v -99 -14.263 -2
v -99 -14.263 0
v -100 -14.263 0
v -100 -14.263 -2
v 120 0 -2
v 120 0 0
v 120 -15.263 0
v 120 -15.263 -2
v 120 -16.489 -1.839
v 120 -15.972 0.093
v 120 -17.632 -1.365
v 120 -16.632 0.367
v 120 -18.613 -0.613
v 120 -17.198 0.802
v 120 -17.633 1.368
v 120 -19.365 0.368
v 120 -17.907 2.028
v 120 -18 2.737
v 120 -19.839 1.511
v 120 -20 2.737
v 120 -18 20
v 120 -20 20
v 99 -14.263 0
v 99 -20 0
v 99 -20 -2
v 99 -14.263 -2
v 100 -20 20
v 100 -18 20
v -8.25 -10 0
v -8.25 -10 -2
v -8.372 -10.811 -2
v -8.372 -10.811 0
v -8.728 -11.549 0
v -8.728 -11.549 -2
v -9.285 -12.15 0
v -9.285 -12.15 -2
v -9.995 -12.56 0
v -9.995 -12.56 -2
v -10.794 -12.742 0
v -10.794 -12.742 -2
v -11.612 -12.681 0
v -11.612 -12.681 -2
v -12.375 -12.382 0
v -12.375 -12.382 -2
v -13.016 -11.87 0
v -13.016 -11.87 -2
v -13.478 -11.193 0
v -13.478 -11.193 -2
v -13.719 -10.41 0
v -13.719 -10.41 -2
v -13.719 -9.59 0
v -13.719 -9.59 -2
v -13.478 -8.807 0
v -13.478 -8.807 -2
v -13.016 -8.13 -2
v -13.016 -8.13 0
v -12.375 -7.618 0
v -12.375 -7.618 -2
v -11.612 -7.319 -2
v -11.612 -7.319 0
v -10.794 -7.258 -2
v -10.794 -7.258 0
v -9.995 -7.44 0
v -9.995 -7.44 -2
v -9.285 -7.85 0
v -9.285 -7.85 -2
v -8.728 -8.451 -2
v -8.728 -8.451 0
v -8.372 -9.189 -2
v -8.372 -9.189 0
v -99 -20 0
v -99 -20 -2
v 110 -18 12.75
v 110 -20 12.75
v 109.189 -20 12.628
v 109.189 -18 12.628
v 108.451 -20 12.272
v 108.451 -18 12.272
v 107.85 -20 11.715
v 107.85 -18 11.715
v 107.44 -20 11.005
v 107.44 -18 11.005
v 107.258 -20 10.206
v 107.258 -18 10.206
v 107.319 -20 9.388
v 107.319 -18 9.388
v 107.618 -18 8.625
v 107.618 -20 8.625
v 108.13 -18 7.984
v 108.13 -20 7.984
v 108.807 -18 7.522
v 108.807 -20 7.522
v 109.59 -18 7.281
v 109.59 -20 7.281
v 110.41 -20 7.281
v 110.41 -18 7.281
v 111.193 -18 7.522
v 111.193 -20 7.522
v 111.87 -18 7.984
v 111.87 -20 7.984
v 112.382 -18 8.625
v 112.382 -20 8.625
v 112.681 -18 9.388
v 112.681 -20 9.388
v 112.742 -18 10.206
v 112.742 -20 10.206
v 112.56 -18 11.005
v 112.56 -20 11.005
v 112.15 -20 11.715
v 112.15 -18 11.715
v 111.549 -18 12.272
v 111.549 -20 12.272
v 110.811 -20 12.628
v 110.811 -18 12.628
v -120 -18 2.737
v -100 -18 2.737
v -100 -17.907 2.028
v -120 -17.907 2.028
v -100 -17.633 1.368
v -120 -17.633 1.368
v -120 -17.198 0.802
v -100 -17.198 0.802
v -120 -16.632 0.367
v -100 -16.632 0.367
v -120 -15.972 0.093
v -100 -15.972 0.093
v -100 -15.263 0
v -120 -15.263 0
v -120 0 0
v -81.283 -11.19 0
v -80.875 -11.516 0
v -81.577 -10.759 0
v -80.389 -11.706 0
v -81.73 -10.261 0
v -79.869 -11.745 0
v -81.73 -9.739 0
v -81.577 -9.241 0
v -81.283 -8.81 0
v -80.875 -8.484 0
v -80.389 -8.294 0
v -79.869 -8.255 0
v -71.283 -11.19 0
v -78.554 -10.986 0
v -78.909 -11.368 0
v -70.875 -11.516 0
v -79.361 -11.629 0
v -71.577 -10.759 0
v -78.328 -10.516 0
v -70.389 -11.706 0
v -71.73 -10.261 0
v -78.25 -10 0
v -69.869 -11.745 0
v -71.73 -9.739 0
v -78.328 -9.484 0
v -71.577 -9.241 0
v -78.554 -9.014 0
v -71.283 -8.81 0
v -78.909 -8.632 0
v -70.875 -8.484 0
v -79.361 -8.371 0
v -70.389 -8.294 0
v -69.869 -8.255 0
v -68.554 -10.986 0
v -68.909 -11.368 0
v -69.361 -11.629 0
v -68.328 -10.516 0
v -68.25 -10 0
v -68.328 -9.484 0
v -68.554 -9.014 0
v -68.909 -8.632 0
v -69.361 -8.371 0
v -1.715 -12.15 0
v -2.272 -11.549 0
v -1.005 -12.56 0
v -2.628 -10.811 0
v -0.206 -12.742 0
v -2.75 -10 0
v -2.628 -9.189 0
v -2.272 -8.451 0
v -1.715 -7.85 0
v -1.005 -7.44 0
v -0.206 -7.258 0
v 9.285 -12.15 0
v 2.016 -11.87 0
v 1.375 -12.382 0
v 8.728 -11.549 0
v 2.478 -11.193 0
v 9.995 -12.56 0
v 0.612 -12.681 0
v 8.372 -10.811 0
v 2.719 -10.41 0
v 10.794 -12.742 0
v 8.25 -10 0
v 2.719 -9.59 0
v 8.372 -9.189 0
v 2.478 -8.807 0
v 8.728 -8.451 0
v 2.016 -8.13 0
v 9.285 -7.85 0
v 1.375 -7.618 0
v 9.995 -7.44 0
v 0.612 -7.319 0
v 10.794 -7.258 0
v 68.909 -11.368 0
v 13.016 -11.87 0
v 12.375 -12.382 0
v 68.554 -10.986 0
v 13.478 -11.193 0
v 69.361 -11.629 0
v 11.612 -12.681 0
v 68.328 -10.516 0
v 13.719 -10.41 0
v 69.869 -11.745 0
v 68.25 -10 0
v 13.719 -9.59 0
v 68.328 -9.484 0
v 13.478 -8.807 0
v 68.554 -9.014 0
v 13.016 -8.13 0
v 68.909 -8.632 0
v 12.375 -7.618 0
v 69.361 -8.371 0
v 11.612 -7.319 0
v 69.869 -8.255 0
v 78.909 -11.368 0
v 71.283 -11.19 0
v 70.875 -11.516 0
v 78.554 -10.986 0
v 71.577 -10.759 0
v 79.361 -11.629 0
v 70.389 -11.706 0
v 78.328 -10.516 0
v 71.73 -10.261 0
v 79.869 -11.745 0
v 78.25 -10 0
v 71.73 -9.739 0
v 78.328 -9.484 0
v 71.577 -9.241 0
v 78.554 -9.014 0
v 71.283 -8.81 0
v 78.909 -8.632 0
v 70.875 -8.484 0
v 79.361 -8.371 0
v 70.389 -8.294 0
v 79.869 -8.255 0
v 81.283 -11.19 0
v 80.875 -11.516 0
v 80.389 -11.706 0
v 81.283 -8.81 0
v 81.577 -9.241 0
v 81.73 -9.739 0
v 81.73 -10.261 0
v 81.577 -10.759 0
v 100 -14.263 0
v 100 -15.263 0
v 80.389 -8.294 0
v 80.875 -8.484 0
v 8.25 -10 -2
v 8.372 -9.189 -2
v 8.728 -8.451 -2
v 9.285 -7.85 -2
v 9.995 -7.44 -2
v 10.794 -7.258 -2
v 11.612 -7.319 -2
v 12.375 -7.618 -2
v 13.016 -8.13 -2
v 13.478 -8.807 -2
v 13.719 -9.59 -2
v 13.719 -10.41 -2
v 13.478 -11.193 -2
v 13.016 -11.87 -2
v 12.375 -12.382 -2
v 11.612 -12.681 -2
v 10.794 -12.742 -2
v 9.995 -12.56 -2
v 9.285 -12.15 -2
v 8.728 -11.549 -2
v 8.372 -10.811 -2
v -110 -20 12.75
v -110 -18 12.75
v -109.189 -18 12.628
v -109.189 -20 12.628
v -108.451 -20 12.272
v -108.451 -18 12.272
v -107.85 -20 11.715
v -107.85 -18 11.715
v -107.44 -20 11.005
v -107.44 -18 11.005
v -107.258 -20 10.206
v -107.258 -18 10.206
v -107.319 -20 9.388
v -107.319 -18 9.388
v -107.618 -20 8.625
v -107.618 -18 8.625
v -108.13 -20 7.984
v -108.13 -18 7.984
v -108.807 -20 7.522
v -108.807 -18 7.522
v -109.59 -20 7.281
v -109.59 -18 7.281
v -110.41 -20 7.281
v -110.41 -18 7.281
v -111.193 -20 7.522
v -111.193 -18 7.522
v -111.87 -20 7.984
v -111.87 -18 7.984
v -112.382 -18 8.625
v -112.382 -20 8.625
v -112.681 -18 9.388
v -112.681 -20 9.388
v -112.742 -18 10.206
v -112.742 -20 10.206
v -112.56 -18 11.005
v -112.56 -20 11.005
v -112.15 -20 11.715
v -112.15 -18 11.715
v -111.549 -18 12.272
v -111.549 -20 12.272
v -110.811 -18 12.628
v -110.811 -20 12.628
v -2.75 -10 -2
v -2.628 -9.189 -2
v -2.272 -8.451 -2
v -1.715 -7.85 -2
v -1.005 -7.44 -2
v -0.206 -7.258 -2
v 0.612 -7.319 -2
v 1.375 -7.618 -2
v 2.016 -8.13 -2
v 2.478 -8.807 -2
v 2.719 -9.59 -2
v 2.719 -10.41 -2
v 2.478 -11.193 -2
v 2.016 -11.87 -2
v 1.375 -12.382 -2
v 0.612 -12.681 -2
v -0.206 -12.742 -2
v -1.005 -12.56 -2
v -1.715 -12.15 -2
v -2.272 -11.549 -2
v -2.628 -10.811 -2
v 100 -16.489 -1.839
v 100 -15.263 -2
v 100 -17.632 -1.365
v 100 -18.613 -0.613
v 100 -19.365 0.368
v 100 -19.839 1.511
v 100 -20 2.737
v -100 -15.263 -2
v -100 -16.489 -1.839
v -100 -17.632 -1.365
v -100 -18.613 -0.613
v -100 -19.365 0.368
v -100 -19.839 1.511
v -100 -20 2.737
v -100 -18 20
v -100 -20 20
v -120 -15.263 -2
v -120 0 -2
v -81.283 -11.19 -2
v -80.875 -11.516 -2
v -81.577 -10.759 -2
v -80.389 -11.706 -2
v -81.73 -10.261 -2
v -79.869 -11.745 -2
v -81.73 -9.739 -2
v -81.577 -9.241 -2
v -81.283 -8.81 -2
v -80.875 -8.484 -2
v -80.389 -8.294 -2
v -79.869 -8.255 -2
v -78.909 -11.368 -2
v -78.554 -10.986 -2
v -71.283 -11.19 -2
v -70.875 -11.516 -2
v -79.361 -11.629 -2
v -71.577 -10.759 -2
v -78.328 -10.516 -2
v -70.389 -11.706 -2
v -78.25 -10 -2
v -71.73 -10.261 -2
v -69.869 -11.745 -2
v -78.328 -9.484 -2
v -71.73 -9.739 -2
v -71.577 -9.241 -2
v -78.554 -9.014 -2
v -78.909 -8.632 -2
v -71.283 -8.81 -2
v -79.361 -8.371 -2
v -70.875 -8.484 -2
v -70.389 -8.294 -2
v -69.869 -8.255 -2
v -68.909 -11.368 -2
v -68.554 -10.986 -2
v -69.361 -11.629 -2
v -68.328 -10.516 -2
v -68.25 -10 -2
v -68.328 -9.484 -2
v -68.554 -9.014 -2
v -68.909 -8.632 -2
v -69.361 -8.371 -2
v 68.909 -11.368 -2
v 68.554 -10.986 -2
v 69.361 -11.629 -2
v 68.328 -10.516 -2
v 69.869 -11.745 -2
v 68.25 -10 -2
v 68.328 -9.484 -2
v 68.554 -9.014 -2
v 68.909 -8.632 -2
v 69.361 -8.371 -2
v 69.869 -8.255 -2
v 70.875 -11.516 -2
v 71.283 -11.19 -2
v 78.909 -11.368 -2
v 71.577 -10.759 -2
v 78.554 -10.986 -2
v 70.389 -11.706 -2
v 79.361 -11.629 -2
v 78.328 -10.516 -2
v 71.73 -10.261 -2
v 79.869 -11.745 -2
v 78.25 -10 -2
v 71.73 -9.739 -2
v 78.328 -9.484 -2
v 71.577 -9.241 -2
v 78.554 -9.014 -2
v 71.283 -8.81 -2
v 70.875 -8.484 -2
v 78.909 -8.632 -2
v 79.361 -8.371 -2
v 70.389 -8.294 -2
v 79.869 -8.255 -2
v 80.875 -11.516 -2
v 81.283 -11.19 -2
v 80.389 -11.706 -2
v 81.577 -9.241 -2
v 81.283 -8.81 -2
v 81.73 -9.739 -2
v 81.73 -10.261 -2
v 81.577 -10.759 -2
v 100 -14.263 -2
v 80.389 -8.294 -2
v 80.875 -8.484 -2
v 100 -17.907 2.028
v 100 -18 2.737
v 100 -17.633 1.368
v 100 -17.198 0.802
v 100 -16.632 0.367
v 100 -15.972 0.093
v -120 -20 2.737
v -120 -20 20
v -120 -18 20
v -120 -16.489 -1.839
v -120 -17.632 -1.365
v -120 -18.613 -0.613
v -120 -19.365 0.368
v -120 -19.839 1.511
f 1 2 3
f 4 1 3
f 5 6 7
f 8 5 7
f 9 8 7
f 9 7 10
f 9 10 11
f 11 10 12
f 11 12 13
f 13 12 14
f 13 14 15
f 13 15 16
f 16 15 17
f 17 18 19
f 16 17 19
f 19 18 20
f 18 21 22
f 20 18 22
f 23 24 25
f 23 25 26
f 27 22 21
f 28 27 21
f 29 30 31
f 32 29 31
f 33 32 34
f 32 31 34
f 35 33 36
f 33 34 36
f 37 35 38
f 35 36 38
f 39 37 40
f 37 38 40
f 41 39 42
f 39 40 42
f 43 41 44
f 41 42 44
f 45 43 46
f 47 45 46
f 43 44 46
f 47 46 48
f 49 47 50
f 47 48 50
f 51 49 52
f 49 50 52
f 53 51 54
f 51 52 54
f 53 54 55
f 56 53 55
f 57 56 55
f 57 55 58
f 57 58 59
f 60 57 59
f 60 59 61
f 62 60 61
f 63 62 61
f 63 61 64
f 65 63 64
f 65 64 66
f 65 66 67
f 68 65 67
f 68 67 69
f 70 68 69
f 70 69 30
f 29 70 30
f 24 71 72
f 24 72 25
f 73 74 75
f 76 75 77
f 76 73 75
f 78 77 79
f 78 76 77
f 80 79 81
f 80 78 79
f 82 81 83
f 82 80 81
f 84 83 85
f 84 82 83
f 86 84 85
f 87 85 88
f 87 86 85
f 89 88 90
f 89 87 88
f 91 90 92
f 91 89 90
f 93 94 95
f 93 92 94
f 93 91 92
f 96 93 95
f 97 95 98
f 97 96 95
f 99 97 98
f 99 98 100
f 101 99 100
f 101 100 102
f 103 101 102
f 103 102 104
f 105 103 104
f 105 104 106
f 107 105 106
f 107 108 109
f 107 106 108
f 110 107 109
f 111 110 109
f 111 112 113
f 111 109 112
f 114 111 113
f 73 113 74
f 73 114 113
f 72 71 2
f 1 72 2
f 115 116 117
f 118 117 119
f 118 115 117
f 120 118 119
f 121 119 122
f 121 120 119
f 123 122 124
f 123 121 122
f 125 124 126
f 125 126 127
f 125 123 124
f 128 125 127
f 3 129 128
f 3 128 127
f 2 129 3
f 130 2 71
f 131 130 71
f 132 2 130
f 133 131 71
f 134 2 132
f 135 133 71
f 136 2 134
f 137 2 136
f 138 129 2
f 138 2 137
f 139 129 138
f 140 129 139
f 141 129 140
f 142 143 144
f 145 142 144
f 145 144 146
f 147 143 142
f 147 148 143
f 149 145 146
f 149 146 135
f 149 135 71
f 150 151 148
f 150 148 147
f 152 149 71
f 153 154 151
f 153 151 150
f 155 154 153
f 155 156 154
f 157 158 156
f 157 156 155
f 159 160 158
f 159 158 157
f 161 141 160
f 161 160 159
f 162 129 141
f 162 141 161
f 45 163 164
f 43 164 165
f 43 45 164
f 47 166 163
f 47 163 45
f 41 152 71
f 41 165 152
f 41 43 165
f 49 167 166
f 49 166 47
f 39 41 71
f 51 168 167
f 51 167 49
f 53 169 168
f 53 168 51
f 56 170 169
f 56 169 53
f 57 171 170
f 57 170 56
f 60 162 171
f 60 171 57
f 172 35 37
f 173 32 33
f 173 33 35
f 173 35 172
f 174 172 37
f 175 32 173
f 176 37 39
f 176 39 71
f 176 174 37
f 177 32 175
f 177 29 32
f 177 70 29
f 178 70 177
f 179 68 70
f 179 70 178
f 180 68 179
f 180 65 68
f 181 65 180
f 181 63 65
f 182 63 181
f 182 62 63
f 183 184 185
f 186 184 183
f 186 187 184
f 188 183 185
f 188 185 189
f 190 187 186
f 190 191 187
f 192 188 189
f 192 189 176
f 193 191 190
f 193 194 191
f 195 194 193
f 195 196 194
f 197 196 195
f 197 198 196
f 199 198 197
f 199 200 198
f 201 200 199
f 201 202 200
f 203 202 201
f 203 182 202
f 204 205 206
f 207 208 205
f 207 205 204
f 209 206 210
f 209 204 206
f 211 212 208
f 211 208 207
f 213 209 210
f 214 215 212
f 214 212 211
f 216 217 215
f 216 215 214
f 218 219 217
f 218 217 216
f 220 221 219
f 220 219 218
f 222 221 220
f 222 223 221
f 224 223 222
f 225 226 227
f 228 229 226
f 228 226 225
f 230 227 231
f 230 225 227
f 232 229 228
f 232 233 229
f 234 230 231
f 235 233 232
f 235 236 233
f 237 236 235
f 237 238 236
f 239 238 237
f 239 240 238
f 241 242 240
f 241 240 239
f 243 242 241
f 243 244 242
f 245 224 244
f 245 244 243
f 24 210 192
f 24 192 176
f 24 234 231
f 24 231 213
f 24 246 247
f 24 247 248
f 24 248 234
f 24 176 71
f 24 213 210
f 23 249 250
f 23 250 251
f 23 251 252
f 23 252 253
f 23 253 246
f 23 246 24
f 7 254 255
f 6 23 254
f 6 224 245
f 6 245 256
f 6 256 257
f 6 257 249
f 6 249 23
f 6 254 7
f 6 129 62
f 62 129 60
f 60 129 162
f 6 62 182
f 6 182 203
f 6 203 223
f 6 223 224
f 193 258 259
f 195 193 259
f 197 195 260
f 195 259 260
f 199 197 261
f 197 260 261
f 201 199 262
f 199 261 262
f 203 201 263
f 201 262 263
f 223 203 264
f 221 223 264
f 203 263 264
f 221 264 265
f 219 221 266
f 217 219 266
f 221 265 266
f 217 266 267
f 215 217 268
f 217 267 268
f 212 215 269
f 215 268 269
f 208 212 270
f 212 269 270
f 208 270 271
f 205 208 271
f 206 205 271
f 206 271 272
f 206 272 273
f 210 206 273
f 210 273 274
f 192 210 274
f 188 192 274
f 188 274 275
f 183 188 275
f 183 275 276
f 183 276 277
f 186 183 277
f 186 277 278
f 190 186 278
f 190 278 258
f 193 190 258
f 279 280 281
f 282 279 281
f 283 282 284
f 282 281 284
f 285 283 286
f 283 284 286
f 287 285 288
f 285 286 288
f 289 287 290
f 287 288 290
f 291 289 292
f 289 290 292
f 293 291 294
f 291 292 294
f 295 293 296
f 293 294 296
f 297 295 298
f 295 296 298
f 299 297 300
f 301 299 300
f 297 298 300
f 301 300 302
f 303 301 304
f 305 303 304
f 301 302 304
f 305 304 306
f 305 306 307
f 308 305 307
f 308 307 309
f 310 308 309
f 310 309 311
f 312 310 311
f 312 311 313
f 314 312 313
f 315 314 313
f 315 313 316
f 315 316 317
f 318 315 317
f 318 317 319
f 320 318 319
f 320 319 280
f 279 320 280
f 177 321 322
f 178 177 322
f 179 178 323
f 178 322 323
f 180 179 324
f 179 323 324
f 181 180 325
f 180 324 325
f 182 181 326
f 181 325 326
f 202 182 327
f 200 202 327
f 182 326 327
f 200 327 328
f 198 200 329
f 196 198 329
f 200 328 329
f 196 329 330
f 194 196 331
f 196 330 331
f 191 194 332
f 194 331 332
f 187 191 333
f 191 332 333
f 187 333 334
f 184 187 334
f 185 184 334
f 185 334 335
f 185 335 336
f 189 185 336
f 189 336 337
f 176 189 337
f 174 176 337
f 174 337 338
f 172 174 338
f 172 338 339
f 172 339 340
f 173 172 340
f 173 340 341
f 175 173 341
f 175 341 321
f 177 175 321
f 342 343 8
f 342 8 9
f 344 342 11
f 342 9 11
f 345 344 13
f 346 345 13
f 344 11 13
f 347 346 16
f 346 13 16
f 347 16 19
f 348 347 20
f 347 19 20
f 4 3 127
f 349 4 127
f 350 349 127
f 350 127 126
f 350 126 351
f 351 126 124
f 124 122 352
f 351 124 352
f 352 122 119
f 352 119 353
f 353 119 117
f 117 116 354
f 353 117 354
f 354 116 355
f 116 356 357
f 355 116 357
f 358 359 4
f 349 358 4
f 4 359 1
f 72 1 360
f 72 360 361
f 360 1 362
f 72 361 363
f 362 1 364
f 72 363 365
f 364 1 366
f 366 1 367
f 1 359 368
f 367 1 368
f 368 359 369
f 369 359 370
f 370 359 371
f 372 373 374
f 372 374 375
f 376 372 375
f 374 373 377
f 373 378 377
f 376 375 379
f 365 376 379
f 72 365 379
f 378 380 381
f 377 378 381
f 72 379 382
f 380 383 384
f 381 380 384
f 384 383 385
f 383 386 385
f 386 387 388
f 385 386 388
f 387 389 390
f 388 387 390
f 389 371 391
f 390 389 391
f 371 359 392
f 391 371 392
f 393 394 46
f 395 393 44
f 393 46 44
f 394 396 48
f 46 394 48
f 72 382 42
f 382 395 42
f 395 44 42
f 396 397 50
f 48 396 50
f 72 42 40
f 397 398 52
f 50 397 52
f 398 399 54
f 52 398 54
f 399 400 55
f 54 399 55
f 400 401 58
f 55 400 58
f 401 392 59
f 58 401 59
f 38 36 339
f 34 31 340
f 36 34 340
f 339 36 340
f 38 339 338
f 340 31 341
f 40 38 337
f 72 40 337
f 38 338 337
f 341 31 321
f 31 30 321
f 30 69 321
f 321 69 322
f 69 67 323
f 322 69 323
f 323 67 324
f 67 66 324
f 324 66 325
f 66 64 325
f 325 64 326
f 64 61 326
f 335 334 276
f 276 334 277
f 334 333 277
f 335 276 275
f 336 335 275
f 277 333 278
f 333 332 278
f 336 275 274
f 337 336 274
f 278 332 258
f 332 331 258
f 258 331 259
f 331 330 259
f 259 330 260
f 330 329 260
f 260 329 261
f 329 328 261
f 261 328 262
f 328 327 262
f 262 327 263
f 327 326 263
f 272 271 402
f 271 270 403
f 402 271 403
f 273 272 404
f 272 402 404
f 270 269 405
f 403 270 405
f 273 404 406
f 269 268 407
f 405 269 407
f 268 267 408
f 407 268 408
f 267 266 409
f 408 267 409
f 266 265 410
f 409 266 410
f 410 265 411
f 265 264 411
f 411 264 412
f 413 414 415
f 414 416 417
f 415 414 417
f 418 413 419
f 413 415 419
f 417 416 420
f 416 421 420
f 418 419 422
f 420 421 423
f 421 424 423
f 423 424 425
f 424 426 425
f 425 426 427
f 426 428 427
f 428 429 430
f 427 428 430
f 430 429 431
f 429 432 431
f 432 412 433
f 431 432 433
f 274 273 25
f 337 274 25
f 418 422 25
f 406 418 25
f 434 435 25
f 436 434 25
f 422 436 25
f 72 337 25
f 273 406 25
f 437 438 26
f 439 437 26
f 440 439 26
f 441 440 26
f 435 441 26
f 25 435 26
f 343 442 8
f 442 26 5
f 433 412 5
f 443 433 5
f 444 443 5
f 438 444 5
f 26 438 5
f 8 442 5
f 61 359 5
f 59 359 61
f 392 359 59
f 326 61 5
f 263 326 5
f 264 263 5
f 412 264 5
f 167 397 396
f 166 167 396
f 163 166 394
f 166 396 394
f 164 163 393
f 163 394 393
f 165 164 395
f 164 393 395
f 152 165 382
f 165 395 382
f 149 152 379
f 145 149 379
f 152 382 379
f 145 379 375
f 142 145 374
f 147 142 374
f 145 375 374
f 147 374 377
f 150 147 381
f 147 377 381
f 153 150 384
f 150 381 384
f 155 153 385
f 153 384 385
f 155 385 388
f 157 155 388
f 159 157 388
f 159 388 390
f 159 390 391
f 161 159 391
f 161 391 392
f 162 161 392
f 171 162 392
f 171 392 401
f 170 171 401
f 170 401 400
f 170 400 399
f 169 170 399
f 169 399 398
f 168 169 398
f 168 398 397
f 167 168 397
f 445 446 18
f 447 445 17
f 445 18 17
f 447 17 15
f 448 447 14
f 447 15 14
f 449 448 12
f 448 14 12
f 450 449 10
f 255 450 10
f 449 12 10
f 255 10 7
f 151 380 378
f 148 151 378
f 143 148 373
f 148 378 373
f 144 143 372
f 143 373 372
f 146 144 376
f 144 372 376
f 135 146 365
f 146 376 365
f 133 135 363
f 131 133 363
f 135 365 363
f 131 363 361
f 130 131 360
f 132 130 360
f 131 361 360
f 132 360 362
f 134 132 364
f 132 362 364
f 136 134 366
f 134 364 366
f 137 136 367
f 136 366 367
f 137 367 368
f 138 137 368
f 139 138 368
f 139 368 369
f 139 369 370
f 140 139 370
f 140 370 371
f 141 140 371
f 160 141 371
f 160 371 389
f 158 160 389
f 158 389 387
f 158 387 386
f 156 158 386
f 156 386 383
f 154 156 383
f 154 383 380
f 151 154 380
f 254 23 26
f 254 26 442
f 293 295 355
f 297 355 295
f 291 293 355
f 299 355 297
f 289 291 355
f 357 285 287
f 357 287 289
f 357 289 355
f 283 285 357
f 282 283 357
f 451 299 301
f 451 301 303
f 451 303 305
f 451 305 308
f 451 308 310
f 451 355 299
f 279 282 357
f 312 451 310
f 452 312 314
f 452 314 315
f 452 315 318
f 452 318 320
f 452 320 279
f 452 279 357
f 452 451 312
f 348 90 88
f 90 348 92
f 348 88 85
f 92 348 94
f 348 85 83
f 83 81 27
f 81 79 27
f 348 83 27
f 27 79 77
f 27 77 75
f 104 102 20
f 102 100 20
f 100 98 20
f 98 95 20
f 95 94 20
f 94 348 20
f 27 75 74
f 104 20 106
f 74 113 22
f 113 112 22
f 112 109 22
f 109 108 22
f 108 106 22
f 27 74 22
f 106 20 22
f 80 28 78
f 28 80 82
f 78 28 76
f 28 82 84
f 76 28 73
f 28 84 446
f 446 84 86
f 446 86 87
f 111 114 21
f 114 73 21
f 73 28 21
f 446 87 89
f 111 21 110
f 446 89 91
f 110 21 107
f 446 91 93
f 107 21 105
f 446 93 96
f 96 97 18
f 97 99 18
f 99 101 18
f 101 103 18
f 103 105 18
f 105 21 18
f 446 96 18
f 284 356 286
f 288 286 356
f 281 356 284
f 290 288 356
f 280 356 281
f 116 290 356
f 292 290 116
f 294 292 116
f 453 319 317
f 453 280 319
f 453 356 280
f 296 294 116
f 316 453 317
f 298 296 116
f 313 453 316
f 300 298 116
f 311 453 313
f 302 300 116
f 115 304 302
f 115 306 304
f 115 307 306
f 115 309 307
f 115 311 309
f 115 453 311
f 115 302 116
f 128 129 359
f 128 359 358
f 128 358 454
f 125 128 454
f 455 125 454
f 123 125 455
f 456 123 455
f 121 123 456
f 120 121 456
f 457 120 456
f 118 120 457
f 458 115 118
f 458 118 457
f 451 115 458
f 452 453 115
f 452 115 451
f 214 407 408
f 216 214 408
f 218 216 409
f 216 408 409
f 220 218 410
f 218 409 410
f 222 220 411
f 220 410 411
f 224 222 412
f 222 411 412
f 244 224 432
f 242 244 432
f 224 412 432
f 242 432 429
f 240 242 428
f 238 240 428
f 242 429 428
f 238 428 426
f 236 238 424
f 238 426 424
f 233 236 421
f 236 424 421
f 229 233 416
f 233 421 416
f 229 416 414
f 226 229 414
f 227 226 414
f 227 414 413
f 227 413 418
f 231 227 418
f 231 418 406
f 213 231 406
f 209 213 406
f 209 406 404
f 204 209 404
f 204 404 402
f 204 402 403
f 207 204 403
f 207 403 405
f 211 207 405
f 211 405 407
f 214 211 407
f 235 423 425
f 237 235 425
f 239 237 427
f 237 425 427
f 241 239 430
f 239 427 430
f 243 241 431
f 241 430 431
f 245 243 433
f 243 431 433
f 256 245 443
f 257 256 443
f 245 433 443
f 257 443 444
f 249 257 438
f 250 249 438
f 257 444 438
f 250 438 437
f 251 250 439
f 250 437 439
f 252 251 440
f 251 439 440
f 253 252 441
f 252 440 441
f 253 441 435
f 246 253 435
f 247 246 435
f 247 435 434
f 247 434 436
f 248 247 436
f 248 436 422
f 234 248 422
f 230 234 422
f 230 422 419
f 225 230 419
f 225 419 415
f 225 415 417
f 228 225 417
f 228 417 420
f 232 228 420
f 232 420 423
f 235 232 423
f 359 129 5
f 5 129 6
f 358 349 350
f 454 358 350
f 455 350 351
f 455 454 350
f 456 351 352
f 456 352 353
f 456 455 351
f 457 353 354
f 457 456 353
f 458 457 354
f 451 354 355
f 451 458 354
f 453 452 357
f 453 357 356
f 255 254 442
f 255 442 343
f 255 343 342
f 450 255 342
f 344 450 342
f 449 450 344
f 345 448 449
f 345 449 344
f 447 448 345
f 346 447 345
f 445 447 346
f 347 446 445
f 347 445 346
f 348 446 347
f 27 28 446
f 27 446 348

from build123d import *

# Parameters (mm, degrees)
SKETCH_1_W                        = 240
SKETCH_1_H                        = 20
SM_BASE_FLANGE_1_DEPTH            = 2
SM_EDGE_FLANGE_1_STRIP_W          = 13.4732
SM_EDGE_FLANGE_1_STRIP_H          = 2
SM_EDGE_FLANGE_1_STRIP_CUT_DEPTH  = 20
SM_EDGE_FLANGE_1_RELIEF_W         = 14.4732
SM_EDGE_FLANGE_1_RELIEF_H         = 1
SM_EDGE_FLANGE_1_RELIEF_CUT_DEPTH = 2
SM_EDGE_FLANGE_1_DEPTH            = 20
SKETCH_10_R                       = 2.75
CUT_EXTRUDE_2_DEPTH               = 10
SKETCH_11_R                       = 2.75
SKETCH_11_R_2                     = 1.75
CUT_EXTRUDE_3_DEPTH               = 10


# Sheet-metal steps are written as plain solids
with BuildPart() as part:
    # Sketch 1 → 基体-法兰1 (new body)
    with BuildSketch(Plane.XY):
        with Locations((0, -10)):
            Rectangle(SKETCH_1_W, SKETCH_1_H)
    extrude(amount=-SM_BASE_FLANGE_1_DEPTH)

    # 边线-法兰1 strip (across the edge) → 边线-法兰1 strip cut (cut)
    with BuildSketch(Plane(origin=(-120, -20, 0), x_dir=(0, 1, 0), z_dir=(1, 0, 0))):
        with Locations((-2, -1)):
            Rectangle(SM_EDGE_FLANGE_1_STRIP_W, SM_EDGE_FLANGE_1_STRIP_H)
    sm_edge_flange_1_strip_cut = extrude(amount=SM_EDGE_FLANGE_1_STRIP_CUT_DEPTH, mode=Mode.SUBTRACT)

    # 边线-法兰1 relief (on the sheet) → 边线-法兰1 relief cut (cut)
    with BuildSketch(Plane(origin=(-120, -15.2634, 0), x_dir=(0, 1, 0), z_dir=(0, 0, 1))):
        with Locations((-6.2366, -20.5)):
            Rectangle(SM_EDGE_FLANGE_1_RELIEF_W, SM_EDGE_FLANGE_1_RELIEF_H)
    sm_edge_flange_1_relief_cut = extrude(amount=-SM_EDGE_FLANGE_1_RELIEF_CUT_DEPTH, mode=Mode.SUBTRACT)

    # 边线-法兰1 section (across the edge) → 边线-法兰1 (add)
    with BuildSketch(Plane(origin=(-120, -20, 0), x_dir=(0, 1, 0), z_dir=(1, 0, 0))):
        with BuildLine():
            Line((0, 2.7366), (0, 20))
            Line((0, 20), (2, 20))
            Line((2, 20), (2, 2.7366))
            ThreePointArc((2, 2.7366), (2.801531583, 0.801531583), (4.7366, 0))
            Line((4.7366, 0), (4.7366, -2))
            ThreePointArc((4.7366, -2), (1.38731802, -0.61268198), (0, 2.7366))
        make_face()
    sm_edge_flange_1 = extrude(amount=SM_EDGE_FLANGE_1_DEPTH)

    # 草图10 → 切除-拉伸2 (cut)
    with BuildSketch(Plane(origin=(0, -18, 0), x_dir=(1, 0, 0), z_dir=(0, 1, 0))):
        with Locations(Location((-110, -10, 0), (0, 0, 270))):
            Circle(SKETCH_10_R)
    cut_extrude_2 = extrude(amount=-CUT_EXTRUDE_2_DEPTH, mode=Mode.SUBTRACT)

    # 镜向1: 边线-法兰1 strip cut, 边线-法兰1 relief cut, 边线-法兰1, 切除-拉伸2 across plane
    add(sm_edge_flange_1_strip_cut.mirror(Plane(origin=(0, 0, 0), x_dir=(0, 0, 1), z_dir=(1, 0, 0))), mode=Mode.SUBTRACT)
    add(sm_edge_flange_1_relief_cut.mirror(Plane(origin=(0, 0, 0), x_dir=(0, 0, 1), z_dir=(1, 0, 0))), mode=Mode.SUBTRACT)
    add(sm_edge_flange_1.mirror(Plane(origin=(0, 0, 0), x_dir=(0, 0, 1), z_dir=(1, 0, 0))))
    add(cut_extrude_2.mirror(Plane(origin=(0, 0, 0), x_dir=(0, 0, 1), z_dir=(1, 0, 0))), mode=Mode.SUBTRACT)

    # 草图11 → 切除-拉伸3 (cut)
    with BuildSketch(Plane(origin=(0, 0, -2), x_dir=(-1, 0, 0), z_dir=(0, 0, -1))):
        with Locations((0, -10)):
            Circle(SKETCH_11_R)
        with Locations((-11, -10)):
            Circle(SKETCH_11_R)
        with Locations(Location((11, -10, 0), (0, 0, 180))):
            Circle(SKETCH_11_R)
        with Locations((-80, -10)):
            Circle(SKETCH_11_R_2)
        with Locations((-70, -10)):
            Circle(SKETCH_11_R_2)
        with Locations(Location((80, -10, 0), (0, 0, 180))):
            Circle(SKETCH_11_R_2)
        with Locations(Location((70, -10, 0), (0, 0, 180))):
            Circle(SKETCH_11_R_2)
    extrude(amount=-CUT_EXTRUDE_3_DEPTH, mode=Mode.SUBTRACT)


solid = part.part
